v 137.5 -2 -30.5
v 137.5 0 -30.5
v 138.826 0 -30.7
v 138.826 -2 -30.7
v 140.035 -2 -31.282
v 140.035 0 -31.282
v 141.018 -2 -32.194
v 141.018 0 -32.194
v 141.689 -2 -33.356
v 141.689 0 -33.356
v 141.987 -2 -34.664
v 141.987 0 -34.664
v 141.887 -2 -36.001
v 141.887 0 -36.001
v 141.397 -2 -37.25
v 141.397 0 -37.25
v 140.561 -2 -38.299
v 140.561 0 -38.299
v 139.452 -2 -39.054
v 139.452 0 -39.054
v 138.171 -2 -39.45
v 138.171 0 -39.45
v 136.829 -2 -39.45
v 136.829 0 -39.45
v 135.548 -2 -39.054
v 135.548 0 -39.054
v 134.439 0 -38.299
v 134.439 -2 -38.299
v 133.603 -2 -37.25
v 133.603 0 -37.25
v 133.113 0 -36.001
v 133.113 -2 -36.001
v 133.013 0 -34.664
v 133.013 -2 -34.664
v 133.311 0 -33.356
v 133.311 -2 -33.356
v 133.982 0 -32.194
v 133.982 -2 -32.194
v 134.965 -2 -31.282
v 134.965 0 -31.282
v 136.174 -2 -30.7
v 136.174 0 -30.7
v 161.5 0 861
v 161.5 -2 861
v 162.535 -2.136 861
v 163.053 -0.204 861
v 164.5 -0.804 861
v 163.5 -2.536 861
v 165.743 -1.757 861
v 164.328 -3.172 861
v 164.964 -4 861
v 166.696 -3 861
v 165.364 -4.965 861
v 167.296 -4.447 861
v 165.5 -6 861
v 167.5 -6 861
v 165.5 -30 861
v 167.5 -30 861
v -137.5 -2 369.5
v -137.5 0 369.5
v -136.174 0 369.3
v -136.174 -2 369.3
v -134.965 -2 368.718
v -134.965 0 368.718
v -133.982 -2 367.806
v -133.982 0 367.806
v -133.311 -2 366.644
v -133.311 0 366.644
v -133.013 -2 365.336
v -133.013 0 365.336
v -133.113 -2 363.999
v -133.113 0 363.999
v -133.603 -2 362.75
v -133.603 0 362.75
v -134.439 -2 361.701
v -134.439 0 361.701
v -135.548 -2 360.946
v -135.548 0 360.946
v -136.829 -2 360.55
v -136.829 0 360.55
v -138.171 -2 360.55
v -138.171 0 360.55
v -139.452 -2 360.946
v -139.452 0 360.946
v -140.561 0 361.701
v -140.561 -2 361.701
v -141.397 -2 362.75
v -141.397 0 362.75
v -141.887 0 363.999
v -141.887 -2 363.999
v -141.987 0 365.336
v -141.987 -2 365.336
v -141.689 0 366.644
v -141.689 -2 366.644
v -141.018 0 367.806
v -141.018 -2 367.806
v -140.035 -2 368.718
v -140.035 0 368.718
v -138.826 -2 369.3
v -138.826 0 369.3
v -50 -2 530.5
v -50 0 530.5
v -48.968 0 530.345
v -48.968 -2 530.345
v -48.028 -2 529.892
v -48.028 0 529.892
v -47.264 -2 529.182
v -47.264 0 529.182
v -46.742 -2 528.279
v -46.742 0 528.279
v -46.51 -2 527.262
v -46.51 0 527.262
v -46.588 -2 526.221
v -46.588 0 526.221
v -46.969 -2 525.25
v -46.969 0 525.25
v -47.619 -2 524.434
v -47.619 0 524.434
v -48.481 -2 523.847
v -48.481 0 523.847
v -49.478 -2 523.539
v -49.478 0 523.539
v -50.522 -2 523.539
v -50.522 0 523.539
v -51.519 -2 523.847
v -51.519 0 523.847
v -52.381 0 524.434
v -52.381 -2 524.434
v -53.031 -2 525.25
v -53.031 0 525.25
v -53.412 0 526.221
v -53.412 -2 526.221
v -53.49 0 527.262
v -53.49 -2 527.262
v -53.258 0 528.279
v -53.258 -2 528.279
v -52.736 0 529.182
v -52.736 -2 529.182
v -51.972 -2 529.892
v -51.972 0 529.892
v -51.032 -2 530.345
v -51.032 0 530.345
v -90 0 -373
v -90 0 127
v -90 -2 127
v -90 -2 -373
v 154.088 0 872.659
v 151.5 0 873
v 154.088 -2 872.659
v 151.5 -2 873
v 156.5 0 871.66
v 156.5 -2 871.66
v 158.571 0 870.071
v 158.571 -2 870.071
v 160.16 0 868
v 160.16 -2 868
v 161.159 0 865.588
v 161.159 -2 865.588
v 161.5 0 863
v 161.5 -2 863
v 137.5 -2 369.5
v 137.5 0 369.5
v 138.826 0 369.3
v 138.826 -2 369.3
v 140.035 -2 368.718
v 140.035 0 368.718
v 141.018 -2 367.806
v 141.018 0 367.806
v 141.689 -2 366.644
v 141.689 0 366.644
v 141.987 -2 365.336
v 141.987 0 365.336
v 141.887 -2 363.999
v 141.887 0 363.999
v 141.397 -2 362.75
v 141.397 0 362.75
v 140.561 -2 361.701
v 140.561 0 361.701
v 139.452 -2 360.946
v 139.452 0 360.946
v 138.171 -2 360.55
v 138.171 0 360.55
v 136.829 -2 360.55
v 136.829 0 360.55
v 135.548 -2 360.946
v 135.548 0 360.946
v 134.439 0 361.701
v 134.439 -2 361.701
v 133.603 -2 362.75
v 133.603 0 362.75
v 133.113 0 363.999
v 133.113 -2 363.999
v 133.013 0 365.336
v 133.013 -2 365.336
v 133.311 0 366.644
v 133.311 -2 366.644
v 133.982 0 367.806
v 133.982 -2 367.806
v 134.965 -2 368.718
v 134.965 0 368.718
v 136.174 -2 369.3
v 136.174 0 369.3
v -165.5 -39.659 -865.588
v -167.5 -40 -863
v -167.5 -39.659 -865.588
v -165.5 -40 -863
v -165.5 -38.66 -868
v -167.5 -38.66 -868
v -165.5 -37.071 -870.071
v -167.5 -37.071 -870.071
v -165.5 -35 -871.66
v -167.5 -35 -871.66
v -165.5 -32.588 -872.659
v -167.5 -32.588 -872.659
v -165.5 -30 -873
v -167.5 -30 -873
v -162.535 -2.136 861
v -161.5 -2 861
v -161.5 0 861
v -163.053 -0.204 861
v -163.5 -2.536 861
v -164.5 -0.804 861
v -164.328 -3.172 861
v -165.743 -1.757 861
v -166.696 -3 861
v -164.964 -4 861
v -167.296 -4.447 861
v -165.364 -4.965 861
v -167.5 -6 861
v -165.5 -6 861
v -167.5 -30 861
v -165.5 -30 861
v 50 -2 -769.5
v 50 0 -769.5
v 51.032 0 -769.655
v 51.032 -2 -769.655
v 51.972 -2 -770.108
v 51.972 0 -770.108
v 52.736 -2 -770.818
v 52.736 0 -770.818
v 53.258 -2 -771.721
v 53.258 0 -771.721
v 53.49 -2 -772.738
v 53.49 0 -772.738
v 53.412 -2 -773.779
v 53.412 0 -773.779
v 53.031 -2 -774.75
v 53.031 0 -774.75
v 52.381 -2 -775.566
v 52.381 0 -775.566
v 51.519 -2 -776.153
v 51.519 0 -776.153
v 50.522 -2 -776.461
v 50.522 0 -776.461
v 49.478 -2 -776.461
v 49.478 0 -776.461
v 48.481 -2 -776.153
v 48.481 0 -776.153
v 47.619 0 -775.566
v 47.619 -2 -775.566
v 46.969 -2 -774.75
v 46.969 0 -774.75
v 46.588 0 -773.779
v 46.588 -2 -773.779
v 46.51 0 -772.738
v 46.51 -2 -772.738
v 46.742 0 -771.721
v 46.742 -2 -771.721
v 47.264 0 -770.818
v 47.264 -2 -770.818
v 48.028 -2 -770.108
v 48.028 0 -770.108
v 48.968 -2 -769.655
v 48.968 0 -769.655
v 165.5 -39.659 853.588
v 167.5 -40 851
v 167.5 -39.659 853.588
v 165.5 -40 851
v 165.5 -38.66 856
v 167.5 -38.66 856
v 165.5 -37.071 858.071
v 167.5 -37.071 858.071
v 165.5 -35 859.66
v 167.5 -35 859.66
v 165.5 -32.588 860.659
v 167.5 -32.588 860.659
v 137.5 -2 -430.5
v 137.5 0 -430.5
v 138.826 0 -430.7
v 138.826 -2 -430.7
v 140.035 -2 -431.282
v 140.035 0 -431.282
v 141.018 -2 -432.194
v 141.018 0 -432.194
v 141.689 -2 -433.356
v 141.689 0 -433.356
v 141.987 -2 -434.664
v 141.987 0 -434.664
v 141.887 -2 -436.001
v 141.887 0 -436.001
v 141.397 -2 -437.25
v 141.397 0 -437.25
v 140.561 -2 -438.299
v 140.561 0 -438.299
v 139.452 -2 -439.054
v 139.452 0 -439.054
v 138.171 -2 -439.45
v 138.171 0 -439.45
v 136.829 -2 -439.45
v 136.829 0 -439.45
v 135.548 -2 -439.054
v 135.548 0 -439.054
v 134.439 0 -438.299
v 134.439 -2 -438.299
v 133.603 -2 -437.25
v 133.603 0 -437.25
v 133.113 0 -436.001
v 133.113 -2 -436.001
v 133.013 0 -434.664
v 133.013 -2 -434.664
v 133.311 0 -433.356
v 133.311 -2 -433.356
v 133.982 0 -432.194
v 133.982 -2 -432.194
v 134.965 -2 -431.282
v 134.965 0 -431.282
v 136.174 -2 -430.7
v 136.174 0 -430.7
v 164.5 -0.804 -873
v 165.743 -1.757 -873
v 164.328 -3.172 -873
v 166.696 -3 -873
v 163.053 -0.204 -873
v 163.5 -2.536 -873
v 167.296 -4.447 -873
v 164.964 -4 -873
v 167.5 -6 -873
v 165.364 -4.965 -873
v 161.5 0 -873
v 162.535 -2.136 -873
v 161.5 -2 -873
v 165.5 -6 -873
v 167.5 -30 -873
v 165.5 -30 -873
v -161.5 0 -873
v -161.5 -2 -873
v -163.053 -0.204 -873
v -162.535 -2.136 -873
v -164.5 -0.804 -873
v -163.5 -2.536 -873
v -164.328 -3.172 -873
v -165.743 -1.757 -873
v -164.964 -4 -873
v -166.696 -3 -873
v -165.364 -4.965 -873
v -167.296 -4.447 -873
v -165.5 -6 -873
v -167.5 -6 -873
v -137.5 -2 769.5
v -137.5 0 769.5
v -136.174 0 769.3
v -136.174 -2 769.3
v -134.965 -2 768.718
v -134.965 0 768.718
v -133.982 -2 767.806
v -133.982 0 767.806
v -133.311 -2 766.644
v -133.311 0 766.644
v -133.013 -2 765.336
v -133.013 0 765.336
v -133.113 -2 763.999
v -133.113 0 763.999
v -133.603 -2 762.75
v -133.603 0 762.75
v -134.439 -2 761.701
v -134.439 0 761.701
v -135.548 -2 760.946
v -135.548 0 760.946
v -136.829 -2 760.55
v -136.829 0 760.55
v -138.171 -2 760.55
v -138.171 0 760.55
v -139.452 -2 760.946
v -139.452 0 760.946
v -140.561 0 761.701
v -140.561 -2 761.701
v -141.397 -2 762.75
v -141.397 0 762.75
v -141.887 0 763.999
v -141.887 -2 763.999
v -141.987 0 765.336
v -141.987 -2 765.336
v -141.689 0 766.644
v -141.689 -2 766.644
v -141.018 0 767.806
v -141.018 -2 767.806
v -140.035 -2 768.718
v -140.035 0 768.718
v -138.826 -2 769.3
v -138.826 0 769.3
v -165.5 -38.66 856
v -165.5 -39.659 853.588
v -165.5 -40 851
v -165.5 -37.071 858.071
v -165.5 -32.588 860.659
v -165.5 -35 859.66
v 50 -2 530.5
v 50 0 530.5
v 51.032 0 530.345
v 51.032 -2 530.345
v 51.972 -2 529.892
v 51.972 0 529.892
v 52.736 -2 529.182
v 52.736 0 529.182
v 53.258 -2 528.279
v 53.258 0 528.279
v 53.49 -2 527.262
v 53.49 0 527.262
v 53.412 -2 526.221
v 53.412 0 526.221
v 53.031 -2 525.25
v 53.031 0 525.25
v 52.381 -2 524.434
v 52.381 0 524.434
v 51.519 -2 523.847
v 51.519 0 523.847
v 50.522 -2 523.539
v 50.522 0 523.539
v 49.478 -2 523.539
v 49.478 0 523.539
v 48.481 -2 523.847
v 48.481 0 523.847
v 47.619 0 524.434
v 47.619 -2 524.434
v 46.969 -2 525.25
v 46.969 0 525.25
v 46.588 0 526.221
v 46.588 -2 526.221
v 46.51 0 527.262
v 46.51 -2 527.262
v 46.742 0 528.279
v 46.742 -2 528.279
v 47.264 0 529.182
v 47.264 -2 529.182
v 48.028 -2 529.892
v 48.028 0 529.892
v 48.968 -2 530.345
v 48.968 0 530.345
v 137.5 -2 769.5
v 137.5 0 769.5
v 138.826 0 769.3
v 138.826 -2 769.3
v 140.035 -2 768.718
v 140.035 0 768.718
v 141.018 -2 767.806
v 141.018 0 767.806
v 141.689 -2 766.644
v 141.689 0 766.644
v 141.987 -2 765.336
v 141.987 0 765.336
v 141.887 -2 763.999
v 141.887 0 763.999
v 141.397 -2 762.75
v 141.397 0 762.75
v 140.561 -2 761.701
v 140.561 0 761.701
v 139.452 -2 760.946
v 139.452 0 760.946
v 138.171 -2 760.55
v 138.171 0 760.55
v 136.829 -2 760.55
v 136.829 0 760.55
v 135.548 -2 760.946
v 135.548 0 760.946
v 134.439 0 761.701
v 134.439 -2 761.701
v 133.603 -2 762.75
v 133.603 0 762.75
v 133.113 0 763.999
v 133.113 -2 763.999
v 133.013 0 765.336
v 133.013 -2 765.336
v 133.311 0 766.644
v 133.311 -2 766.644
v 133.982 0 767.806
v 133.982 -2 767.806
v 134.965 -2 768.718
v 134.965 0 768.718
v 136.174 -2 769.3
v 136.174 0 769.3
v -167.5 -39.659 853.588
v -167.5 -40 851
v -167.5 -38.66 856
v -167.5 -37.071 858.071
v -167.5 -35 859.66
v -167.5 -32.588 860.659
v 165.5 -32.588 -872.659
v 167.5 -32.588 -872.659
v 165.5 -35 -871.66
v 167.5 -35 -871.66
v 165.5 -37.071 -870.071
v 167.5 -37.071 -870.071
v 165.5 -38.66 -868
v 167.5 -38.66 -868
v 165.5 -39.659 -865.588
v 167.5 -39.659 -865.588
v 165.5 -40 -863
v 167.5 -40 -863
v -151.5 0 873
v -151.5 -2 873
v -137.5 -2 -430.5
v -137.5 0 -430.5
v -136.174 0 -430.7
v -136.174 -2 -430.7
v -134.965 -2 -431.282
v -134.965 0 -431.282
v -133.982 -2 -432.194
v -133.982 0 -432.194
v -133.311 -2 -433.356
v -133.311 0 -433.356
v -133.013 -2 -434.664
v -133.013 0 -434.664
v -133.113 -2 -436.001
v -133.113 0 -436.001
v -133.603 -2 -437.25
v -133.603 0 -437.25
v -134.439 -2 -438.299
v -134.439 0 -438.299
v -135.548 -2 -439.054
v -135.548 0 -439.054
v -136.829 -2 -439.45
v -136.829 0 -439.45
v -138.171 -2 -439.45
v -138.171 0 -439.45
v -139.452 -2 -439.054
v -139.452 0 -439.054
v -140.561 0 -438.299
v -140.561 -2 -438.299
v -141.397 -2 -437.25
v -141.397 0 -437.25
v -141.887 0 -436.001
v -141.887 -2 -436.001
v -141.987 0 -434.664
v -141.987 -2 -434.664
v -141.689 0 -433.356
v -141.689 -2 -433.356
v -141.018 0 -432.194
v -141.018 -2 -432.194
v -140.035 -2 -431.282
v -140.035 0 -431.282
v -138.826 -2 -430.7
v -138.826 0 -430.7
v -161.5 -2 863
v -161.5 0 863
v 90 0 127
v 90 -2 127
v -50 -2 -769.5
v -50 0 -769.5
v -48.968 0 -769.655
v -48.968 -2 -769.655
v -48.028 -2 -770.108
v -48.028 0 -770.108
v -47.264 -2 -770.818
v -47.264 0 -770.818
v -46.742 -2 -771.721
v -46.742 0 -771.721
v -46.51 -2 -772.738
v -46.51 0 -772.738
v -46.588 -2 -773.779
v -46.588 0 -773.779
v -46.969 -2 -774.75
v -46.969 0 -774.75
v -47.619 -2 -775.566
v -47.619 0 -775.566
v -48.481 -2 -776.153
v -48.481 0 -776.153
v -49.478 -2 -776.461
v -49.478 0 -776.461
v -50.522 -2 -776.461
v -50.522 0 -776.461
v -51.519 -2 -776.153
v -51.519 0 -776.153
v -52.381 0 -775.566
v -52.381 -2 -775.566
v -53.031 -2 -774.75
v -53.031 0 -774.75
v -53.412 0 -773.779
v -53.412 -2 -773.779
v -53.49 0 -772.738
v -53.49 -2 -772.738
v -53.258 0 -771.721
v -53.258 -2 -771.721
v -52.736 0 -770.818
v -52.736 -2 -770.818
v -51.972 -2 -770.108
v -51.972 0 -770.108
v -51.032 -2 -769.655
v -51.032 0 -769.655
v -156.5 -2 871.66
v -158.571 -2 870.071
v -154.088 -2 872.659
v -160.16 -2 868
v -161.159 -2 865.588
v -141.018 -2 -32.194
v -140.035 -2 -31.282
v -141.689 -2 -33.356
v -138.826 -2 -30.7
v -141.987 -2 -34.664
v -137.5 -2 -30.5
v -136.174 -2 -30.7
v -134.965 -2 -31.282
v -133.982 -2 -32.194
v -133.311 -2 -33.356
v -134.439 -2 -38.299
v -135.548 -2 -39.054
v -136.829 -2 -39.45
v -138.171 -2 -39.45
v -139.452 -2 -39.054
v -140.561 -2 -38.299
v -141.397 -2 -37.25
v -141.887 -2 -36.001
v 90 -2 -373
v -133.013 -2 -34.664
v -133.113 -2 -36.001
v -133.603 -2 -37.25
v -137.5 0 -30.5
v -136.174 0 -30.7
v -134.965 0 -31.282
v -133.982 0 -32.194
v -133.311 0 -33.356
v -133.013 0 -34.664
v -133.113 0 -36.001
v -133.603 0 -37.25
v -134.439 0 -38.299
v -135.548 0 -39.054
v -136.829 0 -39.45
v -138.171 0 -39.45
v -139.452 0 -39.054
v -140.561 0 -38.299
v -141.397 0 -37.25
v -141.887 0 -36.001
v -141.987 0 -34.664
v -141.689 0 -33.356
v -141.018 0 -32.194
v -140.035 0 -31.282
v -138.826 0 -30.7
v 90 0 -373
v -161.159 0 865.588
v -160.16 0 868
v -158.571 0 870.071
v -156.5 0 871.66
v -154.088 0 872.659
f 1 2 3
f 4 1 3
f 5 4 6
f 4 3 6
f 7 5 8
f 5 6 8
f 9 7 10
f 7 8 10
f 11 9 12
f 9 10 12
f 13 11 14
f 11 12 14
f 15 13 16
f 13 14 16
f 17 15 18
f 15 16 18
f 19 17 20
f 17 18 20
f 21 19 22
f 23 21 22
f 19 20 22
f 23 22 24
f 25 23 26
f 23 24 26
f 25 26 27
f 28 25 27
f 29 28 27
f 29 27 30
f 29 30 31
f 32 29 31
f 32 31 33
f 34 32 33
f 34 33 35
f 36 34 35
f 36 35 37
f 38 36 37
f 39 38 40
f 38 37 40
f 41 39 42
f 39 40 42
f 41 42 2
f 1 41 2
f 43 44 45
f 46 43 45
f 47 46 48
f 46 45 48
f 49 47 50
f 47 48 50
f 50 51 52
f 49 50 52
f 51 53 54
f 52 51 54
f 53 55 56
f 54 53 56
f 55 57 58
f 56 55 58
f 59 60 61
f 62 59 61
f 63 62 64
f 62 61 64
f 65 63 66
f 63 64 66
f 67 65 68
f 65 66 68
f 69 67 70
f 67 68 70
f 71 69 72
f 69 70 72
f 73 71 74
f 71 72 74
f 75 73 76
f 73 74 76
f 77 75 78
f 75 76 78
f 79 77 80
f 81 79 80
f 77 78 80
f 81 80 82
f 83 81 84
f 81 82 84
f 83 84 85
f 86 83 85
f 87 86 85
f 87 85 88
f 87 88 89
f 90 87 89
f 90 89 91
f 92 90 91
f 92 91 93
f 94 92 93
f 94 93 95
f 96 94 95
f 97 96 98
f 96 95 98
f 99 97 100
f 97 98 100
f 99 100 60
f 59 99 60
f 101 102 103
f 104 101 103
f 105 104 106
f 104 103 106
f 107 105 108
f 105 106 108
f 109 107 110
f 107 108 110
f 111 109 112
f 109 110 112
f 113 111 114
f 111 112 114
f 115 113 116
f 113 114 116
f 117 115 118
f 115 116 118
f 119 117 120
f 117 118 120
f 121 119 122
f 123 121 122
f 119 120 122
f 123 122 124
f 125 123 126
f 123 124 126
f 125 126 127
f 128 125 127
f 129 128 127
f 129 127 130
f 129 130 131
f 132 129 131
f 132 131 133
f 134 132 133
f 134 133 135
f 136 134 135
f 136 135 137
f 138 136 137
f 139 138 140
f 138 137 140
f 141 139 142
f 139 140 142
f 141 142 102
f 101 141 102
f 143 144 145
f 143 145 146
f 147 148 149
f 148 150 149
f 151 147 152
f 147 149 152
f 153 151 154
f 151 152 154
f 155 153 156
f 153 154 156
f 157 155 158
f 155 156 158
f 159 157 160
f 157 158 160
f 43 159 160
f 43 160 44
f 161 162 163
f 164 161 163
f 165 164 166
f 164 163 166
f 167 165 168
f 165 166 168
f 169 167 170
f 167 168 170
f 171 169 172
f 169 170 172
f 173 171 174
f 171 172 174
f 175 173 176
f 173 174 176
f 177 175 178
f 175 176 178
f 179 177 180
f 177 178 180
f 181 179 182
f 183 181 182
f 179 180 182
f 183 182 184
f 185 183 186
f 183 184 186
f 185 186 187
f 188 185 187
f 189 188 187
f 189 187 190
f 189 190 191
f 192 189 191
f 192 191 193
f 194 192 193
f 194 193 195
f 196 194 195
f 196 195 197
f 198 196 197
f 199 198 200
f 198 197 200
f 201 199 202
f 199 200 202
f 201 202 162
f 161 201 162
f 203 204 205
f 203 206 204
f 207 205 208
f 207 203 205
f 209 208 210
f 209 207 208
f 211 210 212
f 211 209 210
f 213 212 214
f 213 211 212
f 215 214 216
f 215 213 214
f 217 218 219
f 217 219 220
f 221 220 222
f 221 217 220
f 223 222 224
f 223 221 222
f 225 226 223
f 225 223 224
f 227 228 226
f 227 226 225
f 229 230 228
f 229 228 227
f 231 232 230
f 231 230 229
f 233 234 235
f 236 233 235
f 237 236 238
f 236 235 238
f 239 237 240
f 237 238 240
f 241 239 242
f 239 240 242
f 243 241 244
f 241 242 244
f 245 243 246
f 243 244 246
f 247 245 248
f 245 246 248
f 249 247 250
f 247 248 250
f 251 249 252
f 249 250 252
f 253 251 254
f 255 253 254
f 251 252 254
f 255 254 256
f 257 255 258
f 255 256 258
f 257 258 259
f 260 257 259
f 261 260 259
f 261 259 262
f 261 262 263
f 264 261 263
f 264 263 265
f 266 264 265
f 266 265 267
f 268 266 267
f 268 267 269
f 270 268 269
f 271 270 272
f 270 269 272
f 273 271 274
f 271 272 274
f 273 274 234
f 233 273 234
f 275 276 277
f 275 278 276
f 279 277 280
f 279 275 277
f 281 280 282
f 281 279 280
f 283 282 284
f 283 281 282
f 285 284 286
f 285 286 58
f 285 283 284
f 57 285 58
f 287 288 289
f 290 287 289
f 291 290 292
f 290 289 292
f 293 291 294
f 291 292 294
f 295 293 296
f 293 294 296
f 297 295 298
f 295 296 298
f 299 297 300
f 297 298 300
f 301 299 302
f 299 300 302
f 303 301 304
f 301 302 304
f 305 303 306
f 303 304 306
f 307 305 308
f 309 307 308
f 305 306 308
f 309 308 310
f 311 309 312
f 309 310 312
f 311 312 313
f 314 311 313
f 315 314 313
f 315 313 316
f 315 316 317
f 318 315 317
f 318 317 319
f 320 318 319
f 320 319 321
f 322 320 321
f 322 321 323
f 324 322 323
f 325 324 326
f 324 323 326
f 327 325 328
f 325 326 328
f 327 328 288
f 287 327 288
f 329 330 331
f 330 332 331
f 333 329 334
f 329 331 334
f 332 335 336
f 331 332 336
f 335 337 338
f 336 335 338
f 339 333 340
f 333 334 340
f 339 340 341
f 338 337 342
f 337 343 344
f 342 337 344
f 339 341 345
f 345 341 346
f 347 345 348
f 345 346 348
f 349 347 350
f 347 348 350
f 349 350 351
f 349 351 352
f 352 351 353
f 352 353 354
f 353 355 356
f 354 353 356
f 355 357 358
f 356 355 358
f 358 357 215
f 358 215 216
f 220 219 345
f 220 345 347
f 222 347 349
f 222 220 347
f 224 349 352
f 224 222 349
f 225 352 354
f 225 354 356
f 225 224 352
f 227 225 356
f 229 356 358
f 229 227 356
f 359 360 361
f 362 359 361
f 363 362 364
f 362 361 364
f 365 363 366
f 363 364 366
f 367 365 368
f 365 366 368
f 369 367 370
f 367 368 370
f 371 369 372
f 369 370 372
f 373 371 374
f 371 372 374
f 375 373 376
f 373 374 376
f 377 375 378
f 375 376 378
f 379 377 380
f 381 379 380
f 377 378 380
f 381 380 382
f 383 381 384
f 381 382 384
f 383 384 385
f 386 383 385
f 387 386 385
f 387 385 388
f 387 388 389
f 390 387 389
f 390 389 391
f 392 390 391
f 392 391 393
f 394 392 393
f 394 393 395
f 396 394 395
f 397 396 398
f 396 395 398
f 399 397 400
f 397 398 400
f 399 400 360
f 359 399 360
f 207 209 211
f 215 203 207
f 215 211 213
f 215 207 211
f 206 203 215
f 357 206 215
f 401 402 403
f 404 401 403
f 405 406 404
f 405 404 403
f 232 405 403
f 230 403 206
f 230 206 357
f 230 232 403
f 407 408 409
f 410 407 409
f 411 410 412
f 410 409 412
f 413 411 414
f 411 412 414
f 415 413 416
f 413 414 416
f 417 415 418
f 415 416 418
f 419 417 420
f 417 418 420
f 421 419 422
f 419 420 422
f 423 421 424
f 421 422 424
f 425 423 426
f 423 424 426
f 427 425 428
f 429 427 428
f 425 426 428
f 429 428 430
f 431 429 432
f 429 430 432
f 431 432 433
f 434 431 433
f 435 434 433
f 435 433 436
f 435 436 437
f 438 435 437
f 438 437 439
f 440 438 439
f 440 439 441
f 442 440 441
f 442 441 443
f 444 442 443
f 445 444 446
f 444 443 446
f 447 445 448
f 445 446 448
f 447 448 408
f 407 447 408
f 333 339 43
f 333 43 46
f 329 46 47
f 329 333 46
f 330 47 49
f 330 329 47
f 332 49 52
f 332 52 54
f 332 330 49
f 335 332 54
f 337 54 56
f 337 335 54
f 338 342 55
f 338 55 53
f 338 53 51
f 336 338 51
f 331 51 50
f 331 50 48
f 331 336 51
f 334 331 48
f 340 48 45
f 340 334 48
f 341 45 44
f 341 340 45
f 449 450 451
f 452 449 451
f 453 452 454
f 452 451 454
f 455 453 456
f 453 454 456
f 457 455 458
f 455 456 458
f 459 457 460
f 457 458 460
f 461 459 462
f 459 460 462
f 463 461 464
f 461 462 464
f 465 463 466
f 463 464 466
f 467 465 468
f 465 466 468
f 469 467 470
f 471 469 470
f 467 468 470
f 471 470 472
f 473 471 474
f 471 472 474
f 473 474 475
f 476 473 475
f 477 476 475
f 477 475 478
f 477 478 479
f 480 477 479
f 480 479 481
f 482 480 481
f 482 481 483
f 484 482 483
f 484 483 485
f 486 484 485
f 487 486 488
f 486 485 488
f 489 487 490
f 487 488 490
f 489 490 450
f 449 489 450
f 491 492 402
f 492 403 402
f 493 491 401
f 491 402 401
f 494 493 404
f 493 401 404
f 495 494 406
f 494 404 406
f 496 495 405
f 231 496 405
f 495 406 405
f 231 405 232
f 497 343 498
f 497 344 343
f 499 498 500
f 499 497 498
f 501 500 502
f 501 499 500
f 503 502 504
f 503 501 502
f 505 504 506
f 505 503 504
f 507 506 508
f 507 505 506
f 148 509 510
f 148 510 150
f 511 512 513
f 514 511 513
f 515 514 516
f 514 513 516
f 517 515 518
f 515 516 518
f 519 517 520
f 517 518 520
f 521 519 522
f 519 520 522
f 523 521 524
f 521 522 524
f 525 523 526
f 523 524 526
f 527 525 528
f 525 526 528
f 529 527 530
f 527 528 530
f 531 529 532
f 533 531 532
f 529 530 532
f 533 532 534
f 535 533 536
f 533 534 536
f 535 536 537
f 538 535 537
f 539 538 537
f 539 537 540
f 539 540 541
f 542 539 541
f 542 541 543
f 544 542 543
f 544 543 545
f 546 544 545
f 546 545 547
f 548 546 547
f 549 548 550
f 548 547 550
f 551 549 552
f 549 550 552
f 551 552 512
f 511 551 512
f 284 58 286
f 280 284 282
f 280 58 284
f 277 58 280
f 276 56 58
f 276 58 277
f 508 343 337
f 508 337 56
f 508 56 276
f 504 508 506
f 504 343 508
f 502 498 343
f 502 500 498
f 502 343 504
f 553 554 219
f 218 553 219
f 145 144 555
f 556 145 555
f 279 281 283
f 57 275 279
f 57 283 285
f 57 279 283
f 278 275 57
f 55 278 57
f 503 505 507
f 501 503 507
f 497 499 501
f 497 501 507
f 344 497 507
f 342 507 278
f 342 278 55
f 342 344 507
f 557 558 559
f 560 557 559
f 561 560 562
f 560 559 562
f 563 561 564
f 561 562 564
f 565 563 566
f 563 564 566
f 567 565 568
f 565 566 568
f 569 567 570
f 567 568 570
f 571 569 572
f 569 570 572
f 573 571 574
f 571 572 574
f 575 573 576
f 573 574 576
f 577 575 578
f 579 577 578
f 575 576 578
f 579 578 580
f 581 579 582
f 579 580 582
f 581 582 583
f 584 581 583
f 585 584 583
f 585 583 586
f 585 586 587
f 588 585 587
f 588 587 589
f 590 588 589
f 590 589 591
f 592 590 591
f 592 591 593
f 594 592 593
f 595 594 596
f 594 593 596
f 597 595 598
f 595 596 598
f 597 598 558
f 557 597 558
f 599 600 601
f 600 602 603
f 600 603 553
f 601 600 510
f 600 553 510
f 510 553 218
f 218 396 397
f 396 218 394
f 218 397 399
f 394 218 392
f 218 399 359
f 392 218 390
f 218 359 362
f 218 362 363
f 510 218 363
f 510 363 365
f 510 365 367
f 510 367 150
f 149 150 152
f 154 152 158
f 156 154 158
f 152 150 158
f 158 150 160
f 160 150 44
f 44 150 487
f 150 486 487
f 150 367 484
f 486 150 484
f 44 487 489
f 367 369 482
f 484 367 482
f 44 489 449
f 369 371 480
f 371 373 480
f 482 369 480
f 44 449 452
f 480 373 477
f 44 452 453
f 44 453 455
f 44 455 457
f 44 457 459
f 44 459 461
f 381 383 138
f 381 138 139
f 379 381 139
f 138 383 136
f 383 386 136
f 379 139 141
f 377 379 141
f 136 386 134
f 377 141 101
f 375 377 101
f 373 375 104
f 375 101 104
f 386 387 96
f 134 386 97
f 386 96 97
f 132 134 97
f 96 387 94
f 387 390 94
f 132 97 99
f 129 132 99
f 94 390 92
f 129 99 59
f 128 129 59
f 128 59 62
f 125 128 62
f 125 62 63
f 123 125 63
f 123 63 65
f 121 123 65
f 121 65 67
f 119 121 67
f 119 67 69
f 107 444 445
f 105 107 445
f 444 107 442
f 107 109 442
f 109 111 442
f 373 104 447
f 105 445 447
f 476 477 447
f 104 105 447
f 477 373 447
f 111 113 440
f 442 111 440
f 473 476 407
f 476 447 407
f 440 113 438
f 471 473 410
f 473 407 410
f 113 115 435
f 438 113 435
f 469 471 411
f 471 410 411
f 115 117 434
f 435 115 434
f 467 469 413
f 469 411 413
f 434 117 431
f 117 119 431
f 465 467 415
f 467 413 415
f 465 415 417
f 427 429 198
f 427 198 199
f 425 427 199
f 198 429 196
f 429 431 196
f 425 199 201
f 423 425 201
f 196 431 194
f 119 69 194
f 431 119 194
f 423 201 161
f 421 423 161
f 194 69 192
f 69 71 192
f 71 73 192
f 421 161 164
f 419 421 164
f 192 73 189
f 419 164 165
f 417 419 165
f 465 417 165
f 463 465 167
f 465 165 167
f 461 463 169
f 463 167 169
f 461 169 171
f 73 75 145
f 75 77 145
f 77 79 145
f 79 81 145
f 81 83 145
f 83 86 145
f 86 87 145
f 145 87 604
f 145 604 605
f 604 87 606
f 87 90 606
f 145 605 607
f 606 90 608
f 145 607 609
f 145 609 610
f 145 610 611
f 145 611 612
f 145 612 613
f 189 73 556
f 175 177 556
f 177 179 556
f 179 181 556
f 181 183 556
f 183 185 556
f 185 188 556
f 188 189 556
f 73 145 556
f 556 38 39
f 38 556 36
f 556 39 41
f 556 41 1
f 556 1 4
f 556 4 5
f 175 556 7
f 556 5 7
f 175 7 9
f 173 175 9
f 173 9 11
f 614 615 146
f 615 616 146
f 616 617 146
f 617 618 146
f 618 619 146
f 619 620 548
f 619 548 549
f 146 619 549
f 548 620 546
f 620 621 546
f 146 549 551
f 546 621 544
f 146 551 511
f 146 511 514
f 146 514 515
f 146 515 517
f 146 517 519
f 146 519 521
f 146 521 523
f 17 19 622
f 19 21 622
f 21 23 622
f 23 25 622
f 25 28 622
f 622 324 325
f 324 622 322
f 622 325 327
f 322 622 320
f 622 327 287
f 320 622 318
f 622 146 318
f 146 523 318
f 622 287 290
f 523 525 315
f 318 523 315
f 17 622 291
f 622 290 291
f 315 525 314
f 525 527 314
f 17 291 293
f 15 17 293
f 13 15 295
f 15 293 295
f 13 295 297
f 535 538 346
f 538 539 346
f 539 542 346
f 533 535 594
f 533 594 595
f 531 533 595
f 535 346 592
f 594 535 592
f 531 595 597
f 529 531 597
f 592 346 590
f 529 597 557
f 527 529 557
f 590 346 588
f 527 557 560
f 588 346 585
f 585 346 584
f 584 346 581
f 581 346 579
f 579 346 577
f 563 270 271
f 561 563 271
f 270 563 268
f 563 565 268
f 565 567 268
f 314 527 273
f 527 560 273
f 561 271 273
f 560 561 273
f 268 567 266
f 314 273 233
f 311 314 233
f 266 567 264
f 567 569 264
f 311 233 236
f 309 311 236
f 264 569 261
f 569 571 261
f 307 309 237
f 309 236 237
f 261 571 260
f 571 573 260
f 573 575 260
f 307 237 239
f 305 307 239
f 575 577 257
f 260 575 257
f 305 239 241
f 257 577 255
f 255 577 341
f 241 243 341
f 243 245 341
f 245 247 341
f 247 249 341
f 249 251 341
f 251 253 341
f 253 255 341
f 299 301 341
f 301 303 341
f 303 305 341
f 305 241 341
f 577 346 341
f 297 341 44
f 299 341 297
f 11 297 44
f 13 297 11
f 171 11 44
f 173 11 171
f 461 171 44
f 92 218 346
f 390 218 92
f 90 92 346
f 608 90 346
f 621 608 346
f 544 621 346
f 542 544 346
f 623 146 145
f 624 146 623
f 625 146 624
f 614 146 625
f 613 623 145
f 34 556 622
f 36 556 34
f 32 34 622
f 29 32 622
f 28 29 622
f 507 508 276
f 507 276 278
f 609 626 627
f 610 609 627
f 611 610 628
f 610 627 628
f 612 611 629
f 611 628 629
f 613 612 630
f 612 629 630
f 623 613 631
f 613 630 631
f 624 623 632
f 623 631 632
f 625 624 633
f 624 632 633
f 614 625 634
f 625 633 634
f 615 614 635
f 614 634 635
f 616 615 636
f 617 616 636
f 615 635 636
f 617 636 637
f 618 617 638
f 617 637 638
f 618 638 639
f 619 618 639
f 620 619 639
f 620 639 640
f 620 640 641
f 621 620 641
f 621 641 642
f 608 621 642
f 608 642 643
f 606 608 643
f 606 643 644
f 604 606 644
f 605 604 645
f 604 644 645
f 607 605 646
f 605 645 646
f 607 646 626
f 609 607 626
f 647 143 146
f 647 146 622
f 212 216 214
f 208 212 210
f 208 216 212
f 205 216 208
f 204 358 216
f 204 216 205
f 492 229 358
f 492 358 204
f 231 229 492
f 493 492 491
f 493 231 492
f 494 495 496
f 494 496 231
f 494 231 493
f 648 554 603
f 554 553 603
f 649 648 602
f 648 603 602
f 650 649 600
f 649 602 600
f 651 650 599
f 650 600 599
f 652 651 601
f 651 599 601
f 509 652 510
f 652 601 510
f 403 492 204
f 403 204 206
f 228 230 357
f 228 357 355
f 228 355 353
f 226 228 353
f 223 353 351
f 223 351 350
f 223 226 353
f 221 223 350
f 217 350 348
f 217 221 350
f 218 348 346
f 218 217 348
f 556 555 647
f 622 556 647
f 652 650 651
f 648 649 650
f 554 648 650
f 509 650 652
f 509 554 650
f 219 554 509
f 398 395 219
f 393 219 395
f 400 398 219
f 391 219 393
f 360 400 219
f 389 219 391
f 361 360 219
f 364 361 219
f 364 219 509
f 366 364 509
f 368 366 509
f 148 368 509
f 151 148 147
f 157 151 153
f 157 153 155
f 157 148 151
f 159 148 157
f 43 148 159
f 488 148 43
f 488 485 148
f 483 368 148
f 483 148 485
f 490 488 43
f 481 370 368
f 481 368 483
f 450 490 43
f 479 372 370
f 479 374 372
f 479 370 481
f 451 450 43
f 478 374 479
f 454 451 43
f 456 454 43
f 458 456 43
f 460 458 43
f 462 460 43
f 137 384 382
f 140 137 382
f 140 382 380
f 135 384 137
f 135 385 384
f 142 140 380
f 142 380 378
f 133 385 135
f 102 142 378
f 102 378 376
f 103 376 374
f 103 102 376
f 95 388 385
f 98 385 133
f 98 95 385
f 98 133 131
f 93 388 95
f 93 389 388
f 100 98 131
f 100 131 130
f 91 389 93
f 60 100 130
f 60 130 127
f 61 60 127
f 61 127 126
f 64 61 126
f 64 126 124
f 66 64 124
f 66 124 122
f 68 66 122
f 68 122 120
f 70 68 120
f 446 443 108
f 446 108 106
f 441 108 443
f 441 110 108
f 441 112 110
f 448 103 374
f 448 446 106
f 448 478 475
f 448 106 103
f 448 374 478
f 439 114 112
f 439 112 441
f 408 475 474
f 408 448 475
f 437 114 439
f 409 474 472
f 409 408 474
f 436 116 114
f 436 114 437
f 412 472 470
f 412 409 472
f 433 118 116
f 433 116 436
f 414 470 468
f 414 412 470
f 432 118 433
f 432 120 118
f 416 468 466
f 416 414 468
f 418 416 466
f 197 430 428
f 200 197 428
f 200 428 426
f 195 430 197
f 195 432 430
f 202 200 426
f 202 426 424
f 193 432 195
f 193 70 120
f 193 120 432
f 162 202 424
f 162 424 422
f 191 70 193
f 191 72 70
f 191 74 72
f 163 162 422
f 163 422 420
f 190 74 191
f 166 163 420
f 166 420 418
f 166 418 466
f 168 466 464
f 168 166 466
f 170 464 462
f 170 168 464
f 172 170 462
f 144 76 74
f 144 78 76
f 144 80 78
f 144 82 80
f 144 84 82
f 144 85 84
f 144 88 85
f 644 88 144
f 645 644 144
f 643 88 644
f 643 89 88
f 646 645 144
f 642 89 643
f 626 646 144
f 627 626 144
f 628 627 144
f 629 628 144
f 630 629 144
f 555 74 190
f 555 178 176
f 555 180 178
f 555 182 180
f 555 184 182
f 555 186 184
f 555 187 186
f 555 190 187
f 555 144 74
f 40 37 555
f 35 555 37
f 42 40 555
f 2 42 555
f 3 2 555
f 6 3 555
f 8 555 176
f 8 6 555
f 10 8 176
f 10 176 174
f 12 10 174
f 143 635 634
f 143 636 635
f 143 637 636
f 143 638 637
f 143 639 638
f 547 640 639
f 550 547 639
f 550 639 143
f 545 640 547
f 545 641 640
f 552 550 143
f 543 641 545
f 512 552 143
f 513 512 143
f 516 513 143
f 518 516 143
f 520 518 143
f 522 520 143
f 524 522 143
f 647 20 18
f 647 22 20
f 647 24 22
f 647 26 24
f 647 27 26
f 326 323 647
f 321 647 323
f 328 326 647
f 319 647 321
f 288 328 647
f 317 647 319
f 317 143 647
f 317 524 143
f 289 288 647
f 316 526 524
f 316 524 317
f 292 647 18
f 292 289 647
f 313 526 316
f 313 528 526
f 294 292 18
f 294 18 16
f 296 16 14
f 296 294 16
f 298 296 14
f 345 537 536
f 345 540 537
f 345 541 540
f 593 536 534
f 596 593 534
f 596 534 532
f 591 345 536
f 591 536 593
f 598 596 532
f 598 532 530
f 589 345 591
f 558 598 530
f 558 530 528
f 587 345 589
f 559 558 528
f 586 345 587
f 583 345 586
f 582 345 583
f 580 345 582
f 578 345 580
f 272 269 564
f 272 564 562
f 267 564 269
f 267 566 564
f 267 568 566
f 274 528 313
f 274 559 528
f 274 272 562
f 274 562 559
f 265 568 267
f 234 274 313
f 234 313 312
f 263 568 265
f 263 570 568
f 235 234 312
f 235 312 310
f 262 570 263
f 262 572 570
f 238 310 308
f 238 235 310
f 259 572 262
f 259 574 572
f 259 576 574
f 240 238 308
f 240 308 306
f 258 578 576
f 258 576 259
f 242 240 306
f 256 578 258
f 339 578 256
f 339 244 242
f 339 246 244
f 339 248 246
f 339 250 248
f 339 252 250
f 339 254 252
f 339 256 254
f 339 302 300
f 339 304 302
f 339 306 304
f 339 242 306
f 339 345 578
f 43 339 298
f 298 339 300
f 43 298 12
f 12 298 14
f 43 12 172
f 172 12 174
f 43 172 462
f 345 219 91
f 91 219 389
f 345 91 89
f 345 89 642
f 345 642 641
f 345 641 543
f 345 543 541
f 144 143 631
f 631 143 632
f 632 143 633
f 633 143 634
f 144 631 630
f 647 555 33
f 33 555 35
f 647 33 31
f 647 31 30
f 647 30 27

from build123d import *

# Parameters (mm, degrees)
SKETCH_1_W                  = 323
SKETCH_1_H                  = 1746
SKETCH_1_R                  = 4.5
SKETCH_1_R_2                = 3.5
SKETCH_1_W_2                = 180
SKETCH_1_H_2                = 500
SM_BASE_FLANGE_1_DEPTH      = 2
SM_EDGE_FLANGE_1_DEPTH      = 1734
SM_EDGE_FLANGE_1_BEND_DEPTH = 1734
FILLET_1_R                  = 10
FILLET_2_R                  = 10


# Sheet-metal steps are written as plain solids
with BuildPart() as part:
    # Sketch 1 → Базовая кромка1 (new body)
    with BuildSketch(Plane(origin=(0, 0, 0), x_dir=(1, 0, 0), z_dir=(0, 1, 0))):
        Rectangle(SKETCH_1_W, SKETCH_1_H)
        with Locations(Location((-137.5, -765, 0), (0, 0, 270))):
            Circle(SKETCH_1_R, mode=Mode.SUBTRACT)
        with Locations(Location((137.5, -765, 0), (0, 0, 270))):
            Circle(SKETCH_1_R, mode=Mode.SUBTRACT)
        with Locations(Location((-137.5, -365, 0), (0, 0, 270))):
            Circle(SKETCH_1_R, mode=Mode.SUBTRACT)
        with Locations(Location((137.5, -365, 0), (0, 0, 270))):
            Circle(SKETCH_1_R, mode=Mode.SUBTRACT)
        with Locations(Location((-137.5, 35, 0), (0, 0, 270))):
            Circle(SKETCH_1_R, mode=Mode.SUBTRACT)
        with Locations(Location((137.5, 35, 0), (0, 0, 270))):
            Circle(SKETCH_1_R, mode=Mode.SUBTRACT)
        with Locations(Location((-137.5, 435, 0), (0, 0, 270))):
            Circle(SKETCH_1_R, mode=Mode.SUBTRACT)
        with Locations(Location((137.5, 435, 0), (0, 0, 270))):
            Circle(SKETCH_1_R, mode=Mode.SUBTRACT)
        with Locations(Location((-50, -527, 0), (0, 0, 270))):
            Circle(SKETCH_1_R_2, mode=Mode.SUBTRACT)
        with Locations(Location((50, -527, 0), (0, 0, 270))):
            Circle(SKETCH_1_R_2, mode=Mode.SUBTRACT)
        with Locations(Location((-50, 773, 0), (0, 0, 270))):
            Circle(SKETCH_1_R_2, mode=Mode.SUBTRACT)
        with Locations(Location((50, 773, 0), (0, 0, 270))):
            Circle(SKETCH_1_R_2, mode=Mode.SUBTRACT)
        with Locations((0, 123)):
            Rectangle(SKETCH_1_W_2, SKETCH_1_H_2, mode=Mode.SUBTRACT)
    extrude(amount=-SM_BASE_FLANGE_1_DEPTH)

    # Ребро-кромка1 section (across the edge) → Ребро-кромка1 (add)
    with BuildSketch(Plane(origin=(165.5, -2, -873), x_dir=(-1, 0, 0), z_dir=(0, 0, 1))):
        with BuildLine():
            Line((-2, 4), (-2, 38))
            Line((-2, 38), (0, 38))
            Line((0, 38), (0, 4))
            ThreePointArc((0, 4), (1.171572875, 1.171572875), (4, 0))
            Line((4, 0), (4, -2))
            ThreePointArc((4, -2), (-0.242640687, -0.242640687), (-2, 4))
        make_face()
    extrude(amount=SM_EDGE_FLANGE_1_DEPTH)

    # Ребро-кромка1 section 2 (across the edge) → Ребро-кромка1 bend (add)
    with BuildSketch(Plane(origin=(-165.5, -2, 861), x_dir=(1, 0, 0), z_dir=(0, 0, -1))):
        with BuildLine():
            Line((-2, 4), (-2, 38))
            Line((-2, 38), (0, 38))
            Line((0, 38), (0, 4))
            ThreePointArc((0, 4), (1.171572875, 1.171572875), (4, 0))
            Line((4, 0), (4, -2))
            ThreePointArc((4, -2), (-0.242640687, -0.242640687), (-2, 4))
        make_face()
    extrude(amount=SM_EDGE_FLANGE_1_BEND_DEPTH)

    # Скругление1
    fillet_1_edges = [part.edges().sort_by_distance(p)[0] for p in [
        (-166.5, -40, 861),
        (-166.5, -40, -873),
        (166.5, -40, -873),
        (166.5, -40, 861),
    ]]
    fillet(fillet_1_edges, radius=FILLET_1_R)

    # Скругление2
    fillet_2_edges = [part.edges().sort_by_distance(p)[0] for p in [
        (161.5, -1, 873),
        (-161.5, -1, 873),
    ]]
    fillet(fillet_2_edges, radius=FILLET_2_R)


solid = part.part
